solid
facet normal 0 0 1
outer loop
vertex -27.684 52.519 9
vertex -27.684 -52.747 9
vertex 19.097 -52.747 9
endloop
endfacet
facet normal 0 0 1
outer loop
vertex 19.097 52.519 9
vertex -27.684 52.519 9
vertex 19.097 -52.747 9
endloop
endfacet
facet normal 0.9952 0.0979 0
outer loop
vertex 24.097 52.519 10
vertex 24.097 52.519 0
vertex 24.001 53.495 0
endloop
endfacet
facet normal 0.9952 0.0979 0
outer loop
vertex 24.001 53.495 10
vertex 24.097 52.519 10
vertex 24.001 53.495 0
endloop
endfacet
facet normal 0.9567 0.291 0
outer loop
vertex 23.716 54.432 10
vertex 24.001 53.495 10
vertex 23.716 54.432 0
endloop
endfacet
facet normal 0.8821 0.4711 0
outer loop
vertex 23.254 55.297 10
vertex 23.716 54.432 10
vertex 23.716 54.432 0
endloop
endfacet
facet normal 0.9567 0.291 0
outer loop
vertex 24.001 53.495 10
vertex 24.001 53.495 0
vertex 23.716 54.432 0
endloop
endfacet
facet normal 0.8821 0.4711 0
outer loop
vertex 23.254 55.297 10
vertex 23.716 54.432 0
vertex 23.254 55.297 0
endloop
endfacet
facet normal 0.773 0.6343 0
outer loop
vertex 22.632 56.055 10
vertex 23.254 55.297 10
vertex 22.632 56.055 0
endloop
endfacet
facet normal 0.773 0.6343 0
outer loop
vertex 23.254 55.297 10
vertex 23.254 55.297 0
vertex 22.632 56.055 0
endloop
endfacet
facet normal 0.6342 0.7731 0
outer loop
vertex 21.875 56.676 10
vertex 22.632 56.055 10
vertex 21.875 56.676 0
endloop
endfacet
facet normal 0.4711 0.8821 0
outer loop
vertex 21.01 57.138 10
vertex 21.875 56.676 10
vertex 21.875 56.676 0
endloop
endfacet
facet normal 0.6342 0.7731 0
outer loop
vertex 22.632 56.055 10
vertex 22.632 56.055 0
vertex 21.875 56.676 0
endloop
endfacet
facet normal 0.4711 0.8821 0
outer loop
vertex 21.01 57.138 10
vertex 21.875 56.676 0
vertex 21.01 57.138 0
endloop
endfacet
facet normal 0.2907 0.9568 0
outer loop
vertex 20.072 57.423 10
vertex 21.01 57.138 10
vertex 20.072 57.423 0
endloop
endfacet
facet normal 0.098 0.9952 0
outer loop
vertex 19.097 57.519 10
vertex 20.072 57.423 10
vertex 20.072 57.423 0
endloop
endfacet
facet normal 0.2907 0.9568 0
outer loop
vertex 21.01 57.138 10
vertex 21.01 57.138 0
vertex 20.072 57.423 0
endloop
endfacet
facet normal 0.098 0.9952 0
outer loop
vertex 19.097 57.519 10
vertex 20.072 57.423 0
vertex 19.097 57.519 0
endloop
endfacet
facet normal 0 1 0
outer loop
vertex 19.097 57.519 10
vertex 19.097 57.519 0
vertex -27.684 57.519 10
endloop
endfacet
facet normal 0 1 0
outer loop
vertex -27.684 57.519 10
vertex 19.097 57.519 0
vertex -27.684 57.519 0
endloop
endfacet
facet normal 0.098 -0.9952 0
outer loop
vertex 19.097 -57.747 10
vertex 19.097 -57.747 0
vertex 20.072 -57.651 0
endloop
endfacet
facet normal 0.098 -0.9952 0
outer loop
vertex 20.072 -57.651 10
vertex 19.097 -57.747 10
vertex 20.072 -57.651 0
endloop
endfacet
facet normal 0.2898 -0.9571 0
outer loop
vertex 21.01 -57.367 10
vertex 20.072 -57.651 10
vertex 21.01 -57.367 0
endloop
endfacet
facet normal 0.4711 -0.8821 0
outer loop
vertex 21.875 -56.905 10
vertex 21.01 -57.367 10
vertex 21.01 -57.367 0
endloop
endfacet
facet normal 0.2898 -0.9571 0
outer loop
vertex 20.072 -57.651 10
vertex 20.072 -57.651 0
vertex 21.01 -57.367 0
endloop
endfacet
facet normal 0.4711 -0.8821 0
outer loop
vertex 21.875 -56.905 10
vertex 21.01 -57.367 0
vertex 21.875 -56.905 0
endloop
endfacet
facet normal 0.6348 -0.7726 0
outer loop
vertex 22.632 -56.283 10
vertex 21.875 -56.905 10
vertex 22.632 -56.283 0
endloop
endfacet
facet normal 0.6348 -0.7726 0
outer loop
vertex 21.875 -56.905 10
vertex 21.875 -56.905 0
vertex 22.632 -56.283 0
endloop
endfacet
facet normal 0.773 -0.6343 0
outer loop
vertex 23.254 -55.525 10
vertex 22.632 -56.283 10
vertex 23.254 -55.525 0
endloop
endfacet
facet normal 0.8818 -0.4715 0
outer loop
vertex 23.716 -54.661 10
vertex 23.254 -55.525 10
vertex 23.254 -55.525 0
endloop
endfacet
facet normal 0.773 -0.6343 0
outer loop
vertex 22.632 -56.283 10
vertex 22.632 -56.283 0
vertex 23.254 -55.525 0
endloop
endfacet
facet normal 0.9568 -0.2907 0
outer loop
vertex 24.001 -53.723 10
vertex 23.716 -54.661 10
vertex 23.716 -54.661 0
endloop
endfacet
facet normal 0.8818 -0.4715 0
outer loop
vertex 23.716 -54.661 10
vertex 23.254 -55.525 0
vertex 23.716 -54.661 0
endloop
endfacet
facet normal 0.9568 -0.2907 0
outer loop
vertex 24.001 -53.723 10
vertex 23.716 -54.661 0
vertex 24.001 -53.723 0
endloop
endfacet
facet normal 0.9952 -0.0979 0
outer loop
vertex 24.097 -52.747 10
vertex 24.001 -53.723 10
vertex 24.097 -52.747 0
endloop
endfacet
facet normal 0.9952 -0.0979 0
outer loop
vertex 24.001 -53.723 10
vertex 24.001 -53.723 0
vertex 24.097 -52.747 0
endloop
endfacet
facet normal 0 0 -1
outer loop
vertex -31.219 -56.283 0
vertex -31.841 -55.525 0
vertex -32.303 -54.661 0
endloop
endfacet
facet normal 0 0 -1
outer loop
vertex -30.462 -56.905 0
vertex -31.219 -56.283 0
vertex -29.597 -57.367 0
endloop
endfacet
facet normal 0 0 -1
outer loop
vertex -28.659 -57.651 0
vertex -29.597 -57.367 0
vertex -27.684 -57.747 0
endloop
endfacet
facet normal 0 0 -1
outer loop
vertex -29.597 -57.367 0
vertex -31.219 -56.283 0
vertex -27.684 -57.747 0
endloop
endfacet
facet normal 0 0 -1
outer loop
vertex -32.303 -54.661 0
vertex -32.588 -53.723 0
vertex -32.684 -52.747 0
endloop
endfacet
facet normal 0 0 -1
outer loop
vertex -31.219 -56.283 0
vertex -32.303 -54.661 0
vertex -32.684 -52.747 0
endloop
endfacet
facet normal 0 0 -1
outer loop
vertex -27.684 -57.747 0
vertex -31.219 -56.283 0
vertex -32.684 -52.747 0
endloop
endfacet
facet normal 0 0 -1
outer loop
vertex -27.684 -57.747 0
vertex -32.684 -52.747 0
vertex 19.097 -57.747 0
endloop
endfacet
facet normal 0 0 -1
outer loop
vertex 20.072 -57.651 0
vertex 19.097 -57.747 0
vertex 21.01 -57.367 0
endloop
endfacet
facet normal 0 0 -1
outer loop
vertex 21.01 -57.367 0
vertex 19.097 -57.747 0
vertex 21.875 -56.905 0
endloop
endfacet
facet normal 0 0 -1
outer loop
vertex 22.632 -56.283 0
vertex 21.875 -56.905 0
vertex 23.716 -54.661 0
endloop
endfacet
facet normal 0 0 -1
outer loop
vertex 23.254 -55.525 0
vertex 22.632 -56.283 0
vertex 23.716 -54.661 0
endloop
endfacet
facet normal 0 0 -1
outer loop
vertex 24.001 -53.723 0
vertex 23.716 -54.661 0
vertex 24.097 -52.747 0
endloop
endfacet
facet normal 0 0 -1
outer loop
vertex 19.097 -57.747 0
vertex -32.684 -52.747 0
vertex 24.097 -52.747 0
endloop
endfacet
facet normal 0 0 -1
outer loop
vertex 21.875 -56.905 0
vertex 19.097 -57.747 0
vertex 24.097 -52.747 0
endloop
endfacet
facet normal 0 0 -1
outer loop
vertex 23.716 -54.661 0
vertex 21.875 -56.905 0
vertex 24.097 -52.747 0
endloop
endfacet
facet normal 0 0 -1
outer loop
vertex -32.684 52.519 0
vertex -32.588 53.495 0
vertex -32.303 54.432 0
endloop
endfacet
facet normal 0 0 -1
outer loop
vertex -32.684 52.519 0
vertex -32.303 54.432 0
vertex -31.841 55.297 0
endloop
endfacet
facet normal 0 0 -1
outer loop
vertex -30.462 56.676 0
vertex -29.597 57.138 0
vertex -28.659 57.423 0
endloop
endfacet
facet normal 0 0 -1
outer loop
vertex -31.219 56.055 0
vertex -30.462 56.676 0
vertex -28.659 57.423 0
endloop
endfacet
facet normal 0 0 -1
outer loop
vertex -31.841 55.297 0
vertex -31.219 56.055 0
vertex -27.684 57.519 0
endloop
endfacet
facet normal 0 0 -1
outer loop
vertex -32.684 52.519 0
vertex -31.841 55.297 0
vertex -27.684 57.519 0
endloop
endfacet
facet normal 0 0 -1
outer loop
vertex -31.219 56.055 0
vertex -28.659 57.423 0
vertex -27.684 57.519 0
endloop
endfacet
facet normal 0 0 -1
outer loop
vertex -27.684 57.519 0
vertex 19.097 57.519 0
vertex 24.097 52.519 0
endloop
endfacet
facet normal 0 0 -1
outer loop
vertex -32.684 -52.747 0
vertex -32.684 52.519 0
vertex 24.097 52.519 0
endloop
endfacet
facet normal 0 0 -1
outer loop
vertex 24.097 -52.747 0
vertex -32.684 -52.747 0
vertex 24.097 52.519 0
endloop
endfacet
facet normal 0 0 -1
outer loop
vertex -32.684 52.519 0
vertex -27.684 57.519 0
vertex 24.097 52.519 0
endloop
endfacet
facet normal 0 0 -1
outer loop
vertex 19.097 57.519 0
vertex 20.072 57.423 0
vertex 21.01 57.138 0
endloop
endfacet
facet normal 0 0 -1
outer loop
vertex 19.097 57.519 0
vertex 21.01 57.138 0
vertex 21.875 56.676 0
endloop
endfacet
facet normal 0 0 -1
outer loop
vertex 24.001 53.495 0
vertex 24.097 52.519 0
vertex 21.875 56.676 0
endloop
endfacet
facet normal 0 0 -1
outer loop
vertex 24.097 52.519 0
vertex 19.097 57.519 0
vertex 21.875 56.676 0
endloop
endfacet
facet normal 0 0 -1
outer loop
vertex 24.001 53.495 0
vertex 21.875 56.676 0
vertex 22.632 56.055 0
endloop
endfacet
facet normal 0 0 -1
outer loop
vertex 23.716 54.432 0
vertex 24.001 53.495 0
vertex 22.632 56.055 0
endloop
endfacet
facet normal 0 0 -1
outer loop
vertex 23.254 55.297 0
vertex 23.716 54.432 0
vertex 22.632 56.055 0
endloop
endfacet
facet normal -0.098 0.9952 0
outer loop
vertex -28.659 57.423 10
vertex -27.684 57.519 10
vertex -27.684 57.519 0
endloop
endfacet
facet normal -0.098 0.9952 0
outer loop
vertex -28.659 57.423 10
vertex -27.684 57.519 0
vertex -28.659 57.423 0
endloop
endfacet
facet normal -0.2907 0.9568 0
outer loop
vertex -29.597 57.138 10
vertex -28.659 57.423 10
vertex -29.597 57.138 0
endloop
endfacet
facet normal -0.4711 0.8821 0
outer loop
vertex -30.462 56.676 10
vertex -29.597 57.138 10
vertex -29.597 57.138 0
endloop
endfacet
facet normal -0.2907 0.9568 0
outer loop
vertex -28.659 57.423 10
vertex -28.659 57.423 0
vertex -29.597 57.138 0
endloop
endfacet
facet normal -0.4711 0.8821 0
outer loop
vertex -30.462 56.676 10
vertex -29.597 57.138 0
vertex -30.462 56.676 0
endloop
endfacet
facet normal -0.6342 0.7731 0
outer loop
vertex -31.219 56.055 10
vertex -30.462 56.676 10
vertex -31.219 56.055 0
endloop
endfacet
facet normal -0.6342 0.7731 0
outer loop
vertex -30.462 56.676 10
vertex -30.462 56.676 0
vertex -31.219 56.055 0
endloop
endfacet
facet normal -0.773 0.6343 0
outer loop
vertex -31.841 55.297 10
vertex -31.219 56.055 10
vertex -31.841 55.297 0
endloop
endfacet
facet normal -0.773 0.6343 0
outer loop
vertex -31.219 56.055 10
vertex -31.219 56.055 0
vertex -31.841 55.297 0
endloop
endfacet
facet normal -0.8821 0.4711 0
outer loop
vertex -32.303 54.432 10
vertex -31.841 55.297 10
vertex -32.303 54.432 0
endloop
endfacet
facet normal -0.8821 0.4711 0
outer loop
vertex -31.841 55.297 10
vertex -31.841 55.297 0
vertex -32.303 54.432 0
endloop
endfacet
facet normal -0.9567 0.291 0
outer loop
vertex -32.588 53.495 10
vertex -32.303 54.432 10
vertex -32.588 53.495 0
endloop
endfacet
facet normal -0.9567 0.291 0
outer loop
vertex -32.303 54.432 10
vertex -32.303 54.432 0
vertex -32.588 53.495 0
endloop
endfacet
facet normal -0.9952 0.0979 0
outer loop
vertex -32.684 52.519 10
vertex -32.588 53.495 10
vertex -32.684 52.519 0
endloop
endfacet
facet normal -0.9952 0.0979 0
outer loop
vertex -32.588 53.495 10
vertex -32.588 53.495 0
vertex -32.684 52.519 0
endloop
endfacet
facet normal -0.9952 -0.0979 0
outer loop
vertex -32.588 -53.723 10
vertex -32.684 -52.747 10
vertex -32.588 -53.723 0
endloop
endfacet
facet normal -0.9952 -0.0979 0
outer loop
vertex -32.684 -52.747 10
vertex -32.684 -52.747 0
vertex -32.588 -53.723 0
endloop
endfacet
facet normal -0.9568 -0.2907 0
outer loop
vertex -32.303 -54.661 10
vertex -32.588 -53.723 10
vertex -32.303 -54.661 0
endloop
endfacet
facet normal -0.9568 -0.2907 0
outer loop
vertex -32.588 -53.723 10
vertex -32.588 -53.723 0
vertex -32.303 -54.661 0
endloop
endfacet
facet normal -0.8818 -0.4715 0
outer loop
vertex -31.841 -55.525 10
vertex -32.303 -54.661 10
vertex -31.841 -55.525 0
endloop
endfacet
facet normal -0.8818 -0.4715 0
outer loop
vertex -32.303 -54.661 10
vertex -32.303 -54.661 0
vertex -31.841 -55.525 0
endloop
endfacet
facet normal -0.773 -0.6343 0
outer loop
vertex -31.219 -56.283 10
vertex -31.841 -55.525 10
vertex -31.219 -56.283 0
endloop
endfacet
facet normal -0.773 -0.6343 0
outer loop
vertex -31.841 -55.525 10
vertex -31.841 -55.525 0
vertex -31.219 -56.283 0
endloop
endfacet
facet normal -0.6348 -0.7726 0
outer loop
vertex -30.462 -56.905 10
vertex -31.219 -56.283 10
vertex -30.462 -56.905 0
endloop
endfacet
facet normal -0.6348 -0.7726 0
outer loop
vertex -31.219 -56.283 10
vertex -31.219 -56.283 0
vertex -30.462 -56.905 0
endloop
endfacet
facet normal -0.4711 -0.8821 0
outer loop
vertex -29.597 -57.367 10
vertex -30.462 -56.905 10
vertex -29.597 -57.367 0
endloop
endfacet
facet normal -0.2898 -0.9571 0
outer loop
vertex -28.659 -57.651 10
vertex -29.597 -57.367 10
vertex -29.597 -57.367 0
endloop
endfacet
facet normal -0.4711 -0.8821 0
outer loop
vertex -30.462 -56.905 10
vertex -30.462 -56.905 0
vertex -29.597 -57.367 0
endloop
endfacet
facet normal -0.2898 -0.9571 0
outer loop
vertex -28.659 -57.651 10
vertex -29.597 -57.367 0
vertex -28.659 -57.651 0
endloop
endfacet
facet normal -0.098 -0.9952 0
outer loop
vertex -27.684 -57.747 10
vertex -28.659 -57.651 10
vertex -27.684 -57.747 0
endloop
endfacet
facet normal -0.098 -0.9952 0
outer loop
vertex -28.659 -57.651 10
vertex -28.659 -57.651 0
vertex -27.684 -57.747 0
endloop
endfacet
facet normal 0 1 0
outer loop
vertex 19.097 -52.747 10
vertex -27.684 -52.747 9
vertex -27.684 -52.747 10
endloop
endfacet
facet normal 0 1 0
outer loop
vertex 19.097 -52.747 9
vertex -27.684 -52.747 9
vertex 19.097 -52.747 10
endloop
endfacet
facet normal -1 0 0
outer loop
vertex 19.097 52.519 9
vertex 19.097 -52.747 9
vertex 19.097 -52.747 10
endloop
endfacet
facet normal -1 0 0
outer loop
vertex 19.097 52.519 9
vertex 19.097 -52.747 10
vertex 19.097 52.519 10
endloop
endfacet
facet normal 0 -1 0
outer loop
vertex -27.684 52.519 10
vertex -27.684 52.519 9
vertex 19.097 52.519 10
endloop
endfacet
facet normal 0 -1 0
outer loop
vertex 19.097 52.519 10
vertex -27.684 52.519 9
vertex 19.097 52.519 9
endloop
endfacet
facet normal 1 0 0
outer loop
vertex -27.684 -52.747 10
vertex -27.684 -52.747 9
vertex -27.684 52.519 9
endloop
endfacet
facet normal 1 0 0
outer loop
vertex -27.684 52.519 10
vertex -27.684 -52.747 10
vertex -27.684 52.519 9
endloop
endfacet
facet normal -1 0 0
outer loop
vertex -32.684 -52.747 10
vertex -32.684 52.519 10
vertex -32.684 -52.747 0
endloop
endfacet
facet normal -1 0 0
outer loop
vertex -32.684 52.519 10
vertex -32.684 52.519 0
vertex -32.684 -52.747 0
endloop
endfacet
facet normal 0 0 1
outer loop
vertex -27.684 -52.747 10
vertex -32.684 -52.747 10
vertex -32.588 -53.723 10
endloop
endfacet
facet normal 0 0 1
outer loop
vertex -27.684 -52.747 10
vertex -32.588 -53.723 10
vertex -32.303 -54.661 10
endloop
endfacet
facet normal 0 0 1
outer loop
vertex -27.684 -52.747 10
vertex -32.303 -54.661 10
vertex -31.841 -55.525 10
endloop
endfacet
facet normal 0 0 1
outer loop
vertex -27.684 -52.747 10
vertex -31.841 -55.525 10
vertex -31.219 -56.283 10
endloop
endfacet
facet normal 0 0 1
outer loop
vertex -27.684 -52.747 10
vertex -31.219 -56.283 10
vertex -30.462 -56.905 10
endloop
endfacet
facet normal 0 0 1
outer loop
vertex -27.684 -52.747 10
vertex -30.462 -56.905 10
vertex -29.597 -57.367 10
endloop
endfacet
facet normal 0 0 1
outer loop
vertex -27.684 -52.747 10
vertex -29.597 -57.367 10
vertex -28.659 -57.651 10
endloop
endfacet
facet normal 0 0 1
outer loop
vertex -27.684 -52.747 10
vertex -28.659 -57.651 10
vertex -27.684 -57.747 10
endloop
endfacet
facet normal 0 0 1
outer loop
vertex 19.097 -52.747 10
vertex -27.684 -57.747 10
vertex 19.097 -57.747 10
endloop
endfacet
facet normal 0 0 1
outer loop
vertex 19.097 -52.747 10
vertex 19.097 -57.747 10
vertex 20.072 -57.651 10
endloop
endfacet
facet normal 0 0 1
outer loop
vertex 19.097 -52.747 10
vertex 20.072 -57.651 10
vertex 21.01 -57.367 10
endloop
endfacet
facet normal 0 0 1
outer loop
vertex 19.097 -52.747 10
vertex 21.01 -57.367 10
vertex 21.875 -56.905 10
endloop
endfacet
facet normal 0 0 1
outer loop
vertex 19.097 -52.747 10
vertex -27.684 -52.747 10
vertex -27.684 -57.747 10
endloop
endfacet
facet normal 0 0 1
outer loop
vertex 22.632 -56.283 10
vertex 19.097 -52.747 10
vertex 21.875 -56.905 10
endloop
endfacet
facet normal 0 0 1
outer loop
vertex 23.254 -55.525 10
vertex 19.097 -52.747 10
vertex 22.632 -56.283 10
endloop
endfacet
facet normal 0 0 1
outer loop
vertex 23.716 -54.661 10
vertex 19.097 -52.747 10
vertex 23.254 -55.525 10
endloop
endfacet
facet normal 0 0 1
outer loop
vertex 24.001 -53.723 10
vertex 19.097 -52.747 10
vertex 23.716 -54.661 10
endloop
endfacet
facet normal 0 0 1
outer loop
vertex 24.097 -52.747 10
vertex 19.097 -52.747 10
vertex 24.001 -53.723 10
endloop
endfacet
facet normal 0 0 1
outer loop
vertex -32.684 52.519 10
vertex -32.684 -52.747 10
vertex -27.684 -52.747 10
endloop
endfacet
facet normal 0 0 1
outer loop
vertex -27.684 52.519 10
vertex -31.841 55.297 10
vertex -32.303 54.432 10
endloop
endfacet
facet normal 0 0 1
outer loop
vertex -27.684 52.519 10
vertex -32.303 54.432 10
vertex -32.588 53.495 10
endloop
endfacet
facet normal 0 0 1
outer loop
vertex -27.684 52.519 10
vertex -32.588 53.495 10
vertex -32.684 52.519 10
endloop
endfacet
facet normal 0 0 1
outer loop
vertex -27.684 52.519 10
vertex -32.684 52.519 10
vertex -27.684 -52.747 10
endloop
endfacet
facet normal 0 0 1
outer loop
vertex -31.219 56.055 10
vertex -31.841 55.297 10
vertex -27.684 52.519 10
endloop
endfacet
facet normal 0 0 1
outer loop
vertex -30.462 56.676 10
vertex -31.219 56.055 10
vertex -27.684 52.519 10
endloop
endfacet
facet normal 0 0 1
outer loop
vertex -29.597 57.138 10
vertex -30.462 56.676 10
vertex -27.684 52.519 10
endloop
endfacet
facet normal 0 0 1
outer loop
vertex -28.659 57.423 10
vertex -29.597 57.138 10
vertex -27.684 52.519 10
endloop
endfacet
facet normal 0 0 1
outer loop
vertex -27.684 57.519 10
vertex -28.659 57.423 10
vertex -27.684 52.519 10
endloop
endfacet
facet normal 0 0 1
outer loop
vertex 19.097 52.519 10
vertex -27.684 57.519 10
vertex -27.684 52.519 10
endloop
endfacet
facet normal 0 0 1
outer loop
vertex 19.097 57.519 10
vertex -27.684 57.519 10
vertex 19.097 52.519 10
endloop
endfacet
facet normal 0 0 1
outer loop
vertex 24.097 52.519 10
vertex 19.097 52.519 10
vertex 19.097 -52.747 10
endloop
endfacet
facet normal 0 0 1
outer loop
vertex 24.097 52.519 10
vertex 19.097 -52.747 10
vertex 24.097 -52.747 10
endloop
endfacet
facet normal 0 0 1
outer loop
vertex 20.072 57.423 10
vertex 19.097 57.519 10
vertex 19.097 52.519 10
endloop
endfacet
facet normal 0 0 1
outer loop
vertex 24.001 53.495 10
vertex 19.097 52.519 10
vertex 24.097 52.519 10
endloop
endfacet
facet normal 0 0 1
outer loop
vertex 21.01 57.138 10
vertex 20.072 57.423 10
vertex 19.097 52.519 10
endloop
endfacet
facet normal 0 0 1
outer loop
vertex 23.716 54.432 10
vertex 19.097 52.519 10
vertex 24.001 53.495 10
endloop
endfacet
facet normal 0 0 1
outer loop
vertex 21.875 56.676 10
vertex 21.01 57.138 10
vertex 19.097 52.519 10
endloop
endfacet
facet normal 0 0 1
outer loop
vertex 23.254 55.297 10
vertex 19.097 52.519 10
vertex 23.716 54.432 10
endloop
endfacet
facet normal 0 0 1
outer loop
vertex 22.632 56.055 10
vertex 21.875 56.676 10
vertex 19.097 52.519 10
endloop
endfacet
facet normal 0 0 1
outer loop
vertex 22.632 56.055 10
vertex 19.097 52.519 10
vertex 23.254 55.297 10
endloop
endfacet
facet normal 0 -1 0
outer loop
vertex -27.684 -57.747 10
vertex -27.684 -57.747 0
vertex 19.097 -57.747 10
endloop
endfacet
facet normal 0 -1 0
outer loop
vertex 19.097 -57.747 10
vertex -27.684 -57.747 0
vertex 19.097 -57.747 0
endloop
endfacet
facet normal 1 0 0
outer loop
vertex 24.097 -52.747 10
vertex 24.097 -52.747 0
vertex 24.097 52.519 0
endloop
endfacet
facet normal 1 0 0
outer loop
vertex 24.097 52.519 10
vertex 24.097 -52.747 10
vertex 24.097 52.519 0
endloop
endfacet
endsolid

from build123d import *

# Parameters (mm, degrees)
F1_DEPTH = 7
F2_W     = 46.7807637383
F2_H     = 105.2663818344
F3_DEPTH = 2
F4_DEPTH = 3


with BuildPart() as f1:
    # F0 (on Top) → F1 (new body)
    with BuildSketch(Plane.XY):
        with BuildLine():
            Line((19.0969404806, 57.5190660946), (-27.6838232577, 57.5190660946))
            ThreePointArc((-27.6838232577, 57.5190660946), (-31.2193571636, 56.0546000006), (-32.6838232577, 52.5190660946))
            Line((-32.6838232577, 52.5190660946), (-32.6838232577, -52.7473157398))
            ThreePointArc((-32.6838232577, -52.7473157398), (-31.2193571636, -56.2828496457), (-27.6838232577, -57.7473157398))
            Line((-27.6838232577, -57.7473157398), (19.0969404806, -57.7473157398))
            ThreePointArc((19.0969404806, -57.7473157398), (22.6324743865, -56.2828496457), (24.0969404806, -52.7473157398))
            Line((24.0969404806, -52.7473157398), (24.0969404806, 52.5190660946))
            ThreePointArc((24.0969404806, 52.5190660946), (22.6324743865, 56.0546000006), (19.0969404806, 57.5190660946))
        make_face()
    extrude(amount=F1_DEPTH)

    # F2 (on face) → F3 (join)
    with BuildSketch(Plane.XY.offset(7)):
        with Locations((-4.2934413886, -0.1141248226)):
            Rectangle(F2_W, F2_H)
    extrude(amount=F3_DEPTH)

    # F4 (add): a face of the model
    f4_faces = [f1.faces().sort_by_distance(p)[0] for p in [
        (22.8120127039, -0.1141248226, 7),
    ]]
    extrude(f4_faces, amount=F4_DEPTH)


solid = f1.part
